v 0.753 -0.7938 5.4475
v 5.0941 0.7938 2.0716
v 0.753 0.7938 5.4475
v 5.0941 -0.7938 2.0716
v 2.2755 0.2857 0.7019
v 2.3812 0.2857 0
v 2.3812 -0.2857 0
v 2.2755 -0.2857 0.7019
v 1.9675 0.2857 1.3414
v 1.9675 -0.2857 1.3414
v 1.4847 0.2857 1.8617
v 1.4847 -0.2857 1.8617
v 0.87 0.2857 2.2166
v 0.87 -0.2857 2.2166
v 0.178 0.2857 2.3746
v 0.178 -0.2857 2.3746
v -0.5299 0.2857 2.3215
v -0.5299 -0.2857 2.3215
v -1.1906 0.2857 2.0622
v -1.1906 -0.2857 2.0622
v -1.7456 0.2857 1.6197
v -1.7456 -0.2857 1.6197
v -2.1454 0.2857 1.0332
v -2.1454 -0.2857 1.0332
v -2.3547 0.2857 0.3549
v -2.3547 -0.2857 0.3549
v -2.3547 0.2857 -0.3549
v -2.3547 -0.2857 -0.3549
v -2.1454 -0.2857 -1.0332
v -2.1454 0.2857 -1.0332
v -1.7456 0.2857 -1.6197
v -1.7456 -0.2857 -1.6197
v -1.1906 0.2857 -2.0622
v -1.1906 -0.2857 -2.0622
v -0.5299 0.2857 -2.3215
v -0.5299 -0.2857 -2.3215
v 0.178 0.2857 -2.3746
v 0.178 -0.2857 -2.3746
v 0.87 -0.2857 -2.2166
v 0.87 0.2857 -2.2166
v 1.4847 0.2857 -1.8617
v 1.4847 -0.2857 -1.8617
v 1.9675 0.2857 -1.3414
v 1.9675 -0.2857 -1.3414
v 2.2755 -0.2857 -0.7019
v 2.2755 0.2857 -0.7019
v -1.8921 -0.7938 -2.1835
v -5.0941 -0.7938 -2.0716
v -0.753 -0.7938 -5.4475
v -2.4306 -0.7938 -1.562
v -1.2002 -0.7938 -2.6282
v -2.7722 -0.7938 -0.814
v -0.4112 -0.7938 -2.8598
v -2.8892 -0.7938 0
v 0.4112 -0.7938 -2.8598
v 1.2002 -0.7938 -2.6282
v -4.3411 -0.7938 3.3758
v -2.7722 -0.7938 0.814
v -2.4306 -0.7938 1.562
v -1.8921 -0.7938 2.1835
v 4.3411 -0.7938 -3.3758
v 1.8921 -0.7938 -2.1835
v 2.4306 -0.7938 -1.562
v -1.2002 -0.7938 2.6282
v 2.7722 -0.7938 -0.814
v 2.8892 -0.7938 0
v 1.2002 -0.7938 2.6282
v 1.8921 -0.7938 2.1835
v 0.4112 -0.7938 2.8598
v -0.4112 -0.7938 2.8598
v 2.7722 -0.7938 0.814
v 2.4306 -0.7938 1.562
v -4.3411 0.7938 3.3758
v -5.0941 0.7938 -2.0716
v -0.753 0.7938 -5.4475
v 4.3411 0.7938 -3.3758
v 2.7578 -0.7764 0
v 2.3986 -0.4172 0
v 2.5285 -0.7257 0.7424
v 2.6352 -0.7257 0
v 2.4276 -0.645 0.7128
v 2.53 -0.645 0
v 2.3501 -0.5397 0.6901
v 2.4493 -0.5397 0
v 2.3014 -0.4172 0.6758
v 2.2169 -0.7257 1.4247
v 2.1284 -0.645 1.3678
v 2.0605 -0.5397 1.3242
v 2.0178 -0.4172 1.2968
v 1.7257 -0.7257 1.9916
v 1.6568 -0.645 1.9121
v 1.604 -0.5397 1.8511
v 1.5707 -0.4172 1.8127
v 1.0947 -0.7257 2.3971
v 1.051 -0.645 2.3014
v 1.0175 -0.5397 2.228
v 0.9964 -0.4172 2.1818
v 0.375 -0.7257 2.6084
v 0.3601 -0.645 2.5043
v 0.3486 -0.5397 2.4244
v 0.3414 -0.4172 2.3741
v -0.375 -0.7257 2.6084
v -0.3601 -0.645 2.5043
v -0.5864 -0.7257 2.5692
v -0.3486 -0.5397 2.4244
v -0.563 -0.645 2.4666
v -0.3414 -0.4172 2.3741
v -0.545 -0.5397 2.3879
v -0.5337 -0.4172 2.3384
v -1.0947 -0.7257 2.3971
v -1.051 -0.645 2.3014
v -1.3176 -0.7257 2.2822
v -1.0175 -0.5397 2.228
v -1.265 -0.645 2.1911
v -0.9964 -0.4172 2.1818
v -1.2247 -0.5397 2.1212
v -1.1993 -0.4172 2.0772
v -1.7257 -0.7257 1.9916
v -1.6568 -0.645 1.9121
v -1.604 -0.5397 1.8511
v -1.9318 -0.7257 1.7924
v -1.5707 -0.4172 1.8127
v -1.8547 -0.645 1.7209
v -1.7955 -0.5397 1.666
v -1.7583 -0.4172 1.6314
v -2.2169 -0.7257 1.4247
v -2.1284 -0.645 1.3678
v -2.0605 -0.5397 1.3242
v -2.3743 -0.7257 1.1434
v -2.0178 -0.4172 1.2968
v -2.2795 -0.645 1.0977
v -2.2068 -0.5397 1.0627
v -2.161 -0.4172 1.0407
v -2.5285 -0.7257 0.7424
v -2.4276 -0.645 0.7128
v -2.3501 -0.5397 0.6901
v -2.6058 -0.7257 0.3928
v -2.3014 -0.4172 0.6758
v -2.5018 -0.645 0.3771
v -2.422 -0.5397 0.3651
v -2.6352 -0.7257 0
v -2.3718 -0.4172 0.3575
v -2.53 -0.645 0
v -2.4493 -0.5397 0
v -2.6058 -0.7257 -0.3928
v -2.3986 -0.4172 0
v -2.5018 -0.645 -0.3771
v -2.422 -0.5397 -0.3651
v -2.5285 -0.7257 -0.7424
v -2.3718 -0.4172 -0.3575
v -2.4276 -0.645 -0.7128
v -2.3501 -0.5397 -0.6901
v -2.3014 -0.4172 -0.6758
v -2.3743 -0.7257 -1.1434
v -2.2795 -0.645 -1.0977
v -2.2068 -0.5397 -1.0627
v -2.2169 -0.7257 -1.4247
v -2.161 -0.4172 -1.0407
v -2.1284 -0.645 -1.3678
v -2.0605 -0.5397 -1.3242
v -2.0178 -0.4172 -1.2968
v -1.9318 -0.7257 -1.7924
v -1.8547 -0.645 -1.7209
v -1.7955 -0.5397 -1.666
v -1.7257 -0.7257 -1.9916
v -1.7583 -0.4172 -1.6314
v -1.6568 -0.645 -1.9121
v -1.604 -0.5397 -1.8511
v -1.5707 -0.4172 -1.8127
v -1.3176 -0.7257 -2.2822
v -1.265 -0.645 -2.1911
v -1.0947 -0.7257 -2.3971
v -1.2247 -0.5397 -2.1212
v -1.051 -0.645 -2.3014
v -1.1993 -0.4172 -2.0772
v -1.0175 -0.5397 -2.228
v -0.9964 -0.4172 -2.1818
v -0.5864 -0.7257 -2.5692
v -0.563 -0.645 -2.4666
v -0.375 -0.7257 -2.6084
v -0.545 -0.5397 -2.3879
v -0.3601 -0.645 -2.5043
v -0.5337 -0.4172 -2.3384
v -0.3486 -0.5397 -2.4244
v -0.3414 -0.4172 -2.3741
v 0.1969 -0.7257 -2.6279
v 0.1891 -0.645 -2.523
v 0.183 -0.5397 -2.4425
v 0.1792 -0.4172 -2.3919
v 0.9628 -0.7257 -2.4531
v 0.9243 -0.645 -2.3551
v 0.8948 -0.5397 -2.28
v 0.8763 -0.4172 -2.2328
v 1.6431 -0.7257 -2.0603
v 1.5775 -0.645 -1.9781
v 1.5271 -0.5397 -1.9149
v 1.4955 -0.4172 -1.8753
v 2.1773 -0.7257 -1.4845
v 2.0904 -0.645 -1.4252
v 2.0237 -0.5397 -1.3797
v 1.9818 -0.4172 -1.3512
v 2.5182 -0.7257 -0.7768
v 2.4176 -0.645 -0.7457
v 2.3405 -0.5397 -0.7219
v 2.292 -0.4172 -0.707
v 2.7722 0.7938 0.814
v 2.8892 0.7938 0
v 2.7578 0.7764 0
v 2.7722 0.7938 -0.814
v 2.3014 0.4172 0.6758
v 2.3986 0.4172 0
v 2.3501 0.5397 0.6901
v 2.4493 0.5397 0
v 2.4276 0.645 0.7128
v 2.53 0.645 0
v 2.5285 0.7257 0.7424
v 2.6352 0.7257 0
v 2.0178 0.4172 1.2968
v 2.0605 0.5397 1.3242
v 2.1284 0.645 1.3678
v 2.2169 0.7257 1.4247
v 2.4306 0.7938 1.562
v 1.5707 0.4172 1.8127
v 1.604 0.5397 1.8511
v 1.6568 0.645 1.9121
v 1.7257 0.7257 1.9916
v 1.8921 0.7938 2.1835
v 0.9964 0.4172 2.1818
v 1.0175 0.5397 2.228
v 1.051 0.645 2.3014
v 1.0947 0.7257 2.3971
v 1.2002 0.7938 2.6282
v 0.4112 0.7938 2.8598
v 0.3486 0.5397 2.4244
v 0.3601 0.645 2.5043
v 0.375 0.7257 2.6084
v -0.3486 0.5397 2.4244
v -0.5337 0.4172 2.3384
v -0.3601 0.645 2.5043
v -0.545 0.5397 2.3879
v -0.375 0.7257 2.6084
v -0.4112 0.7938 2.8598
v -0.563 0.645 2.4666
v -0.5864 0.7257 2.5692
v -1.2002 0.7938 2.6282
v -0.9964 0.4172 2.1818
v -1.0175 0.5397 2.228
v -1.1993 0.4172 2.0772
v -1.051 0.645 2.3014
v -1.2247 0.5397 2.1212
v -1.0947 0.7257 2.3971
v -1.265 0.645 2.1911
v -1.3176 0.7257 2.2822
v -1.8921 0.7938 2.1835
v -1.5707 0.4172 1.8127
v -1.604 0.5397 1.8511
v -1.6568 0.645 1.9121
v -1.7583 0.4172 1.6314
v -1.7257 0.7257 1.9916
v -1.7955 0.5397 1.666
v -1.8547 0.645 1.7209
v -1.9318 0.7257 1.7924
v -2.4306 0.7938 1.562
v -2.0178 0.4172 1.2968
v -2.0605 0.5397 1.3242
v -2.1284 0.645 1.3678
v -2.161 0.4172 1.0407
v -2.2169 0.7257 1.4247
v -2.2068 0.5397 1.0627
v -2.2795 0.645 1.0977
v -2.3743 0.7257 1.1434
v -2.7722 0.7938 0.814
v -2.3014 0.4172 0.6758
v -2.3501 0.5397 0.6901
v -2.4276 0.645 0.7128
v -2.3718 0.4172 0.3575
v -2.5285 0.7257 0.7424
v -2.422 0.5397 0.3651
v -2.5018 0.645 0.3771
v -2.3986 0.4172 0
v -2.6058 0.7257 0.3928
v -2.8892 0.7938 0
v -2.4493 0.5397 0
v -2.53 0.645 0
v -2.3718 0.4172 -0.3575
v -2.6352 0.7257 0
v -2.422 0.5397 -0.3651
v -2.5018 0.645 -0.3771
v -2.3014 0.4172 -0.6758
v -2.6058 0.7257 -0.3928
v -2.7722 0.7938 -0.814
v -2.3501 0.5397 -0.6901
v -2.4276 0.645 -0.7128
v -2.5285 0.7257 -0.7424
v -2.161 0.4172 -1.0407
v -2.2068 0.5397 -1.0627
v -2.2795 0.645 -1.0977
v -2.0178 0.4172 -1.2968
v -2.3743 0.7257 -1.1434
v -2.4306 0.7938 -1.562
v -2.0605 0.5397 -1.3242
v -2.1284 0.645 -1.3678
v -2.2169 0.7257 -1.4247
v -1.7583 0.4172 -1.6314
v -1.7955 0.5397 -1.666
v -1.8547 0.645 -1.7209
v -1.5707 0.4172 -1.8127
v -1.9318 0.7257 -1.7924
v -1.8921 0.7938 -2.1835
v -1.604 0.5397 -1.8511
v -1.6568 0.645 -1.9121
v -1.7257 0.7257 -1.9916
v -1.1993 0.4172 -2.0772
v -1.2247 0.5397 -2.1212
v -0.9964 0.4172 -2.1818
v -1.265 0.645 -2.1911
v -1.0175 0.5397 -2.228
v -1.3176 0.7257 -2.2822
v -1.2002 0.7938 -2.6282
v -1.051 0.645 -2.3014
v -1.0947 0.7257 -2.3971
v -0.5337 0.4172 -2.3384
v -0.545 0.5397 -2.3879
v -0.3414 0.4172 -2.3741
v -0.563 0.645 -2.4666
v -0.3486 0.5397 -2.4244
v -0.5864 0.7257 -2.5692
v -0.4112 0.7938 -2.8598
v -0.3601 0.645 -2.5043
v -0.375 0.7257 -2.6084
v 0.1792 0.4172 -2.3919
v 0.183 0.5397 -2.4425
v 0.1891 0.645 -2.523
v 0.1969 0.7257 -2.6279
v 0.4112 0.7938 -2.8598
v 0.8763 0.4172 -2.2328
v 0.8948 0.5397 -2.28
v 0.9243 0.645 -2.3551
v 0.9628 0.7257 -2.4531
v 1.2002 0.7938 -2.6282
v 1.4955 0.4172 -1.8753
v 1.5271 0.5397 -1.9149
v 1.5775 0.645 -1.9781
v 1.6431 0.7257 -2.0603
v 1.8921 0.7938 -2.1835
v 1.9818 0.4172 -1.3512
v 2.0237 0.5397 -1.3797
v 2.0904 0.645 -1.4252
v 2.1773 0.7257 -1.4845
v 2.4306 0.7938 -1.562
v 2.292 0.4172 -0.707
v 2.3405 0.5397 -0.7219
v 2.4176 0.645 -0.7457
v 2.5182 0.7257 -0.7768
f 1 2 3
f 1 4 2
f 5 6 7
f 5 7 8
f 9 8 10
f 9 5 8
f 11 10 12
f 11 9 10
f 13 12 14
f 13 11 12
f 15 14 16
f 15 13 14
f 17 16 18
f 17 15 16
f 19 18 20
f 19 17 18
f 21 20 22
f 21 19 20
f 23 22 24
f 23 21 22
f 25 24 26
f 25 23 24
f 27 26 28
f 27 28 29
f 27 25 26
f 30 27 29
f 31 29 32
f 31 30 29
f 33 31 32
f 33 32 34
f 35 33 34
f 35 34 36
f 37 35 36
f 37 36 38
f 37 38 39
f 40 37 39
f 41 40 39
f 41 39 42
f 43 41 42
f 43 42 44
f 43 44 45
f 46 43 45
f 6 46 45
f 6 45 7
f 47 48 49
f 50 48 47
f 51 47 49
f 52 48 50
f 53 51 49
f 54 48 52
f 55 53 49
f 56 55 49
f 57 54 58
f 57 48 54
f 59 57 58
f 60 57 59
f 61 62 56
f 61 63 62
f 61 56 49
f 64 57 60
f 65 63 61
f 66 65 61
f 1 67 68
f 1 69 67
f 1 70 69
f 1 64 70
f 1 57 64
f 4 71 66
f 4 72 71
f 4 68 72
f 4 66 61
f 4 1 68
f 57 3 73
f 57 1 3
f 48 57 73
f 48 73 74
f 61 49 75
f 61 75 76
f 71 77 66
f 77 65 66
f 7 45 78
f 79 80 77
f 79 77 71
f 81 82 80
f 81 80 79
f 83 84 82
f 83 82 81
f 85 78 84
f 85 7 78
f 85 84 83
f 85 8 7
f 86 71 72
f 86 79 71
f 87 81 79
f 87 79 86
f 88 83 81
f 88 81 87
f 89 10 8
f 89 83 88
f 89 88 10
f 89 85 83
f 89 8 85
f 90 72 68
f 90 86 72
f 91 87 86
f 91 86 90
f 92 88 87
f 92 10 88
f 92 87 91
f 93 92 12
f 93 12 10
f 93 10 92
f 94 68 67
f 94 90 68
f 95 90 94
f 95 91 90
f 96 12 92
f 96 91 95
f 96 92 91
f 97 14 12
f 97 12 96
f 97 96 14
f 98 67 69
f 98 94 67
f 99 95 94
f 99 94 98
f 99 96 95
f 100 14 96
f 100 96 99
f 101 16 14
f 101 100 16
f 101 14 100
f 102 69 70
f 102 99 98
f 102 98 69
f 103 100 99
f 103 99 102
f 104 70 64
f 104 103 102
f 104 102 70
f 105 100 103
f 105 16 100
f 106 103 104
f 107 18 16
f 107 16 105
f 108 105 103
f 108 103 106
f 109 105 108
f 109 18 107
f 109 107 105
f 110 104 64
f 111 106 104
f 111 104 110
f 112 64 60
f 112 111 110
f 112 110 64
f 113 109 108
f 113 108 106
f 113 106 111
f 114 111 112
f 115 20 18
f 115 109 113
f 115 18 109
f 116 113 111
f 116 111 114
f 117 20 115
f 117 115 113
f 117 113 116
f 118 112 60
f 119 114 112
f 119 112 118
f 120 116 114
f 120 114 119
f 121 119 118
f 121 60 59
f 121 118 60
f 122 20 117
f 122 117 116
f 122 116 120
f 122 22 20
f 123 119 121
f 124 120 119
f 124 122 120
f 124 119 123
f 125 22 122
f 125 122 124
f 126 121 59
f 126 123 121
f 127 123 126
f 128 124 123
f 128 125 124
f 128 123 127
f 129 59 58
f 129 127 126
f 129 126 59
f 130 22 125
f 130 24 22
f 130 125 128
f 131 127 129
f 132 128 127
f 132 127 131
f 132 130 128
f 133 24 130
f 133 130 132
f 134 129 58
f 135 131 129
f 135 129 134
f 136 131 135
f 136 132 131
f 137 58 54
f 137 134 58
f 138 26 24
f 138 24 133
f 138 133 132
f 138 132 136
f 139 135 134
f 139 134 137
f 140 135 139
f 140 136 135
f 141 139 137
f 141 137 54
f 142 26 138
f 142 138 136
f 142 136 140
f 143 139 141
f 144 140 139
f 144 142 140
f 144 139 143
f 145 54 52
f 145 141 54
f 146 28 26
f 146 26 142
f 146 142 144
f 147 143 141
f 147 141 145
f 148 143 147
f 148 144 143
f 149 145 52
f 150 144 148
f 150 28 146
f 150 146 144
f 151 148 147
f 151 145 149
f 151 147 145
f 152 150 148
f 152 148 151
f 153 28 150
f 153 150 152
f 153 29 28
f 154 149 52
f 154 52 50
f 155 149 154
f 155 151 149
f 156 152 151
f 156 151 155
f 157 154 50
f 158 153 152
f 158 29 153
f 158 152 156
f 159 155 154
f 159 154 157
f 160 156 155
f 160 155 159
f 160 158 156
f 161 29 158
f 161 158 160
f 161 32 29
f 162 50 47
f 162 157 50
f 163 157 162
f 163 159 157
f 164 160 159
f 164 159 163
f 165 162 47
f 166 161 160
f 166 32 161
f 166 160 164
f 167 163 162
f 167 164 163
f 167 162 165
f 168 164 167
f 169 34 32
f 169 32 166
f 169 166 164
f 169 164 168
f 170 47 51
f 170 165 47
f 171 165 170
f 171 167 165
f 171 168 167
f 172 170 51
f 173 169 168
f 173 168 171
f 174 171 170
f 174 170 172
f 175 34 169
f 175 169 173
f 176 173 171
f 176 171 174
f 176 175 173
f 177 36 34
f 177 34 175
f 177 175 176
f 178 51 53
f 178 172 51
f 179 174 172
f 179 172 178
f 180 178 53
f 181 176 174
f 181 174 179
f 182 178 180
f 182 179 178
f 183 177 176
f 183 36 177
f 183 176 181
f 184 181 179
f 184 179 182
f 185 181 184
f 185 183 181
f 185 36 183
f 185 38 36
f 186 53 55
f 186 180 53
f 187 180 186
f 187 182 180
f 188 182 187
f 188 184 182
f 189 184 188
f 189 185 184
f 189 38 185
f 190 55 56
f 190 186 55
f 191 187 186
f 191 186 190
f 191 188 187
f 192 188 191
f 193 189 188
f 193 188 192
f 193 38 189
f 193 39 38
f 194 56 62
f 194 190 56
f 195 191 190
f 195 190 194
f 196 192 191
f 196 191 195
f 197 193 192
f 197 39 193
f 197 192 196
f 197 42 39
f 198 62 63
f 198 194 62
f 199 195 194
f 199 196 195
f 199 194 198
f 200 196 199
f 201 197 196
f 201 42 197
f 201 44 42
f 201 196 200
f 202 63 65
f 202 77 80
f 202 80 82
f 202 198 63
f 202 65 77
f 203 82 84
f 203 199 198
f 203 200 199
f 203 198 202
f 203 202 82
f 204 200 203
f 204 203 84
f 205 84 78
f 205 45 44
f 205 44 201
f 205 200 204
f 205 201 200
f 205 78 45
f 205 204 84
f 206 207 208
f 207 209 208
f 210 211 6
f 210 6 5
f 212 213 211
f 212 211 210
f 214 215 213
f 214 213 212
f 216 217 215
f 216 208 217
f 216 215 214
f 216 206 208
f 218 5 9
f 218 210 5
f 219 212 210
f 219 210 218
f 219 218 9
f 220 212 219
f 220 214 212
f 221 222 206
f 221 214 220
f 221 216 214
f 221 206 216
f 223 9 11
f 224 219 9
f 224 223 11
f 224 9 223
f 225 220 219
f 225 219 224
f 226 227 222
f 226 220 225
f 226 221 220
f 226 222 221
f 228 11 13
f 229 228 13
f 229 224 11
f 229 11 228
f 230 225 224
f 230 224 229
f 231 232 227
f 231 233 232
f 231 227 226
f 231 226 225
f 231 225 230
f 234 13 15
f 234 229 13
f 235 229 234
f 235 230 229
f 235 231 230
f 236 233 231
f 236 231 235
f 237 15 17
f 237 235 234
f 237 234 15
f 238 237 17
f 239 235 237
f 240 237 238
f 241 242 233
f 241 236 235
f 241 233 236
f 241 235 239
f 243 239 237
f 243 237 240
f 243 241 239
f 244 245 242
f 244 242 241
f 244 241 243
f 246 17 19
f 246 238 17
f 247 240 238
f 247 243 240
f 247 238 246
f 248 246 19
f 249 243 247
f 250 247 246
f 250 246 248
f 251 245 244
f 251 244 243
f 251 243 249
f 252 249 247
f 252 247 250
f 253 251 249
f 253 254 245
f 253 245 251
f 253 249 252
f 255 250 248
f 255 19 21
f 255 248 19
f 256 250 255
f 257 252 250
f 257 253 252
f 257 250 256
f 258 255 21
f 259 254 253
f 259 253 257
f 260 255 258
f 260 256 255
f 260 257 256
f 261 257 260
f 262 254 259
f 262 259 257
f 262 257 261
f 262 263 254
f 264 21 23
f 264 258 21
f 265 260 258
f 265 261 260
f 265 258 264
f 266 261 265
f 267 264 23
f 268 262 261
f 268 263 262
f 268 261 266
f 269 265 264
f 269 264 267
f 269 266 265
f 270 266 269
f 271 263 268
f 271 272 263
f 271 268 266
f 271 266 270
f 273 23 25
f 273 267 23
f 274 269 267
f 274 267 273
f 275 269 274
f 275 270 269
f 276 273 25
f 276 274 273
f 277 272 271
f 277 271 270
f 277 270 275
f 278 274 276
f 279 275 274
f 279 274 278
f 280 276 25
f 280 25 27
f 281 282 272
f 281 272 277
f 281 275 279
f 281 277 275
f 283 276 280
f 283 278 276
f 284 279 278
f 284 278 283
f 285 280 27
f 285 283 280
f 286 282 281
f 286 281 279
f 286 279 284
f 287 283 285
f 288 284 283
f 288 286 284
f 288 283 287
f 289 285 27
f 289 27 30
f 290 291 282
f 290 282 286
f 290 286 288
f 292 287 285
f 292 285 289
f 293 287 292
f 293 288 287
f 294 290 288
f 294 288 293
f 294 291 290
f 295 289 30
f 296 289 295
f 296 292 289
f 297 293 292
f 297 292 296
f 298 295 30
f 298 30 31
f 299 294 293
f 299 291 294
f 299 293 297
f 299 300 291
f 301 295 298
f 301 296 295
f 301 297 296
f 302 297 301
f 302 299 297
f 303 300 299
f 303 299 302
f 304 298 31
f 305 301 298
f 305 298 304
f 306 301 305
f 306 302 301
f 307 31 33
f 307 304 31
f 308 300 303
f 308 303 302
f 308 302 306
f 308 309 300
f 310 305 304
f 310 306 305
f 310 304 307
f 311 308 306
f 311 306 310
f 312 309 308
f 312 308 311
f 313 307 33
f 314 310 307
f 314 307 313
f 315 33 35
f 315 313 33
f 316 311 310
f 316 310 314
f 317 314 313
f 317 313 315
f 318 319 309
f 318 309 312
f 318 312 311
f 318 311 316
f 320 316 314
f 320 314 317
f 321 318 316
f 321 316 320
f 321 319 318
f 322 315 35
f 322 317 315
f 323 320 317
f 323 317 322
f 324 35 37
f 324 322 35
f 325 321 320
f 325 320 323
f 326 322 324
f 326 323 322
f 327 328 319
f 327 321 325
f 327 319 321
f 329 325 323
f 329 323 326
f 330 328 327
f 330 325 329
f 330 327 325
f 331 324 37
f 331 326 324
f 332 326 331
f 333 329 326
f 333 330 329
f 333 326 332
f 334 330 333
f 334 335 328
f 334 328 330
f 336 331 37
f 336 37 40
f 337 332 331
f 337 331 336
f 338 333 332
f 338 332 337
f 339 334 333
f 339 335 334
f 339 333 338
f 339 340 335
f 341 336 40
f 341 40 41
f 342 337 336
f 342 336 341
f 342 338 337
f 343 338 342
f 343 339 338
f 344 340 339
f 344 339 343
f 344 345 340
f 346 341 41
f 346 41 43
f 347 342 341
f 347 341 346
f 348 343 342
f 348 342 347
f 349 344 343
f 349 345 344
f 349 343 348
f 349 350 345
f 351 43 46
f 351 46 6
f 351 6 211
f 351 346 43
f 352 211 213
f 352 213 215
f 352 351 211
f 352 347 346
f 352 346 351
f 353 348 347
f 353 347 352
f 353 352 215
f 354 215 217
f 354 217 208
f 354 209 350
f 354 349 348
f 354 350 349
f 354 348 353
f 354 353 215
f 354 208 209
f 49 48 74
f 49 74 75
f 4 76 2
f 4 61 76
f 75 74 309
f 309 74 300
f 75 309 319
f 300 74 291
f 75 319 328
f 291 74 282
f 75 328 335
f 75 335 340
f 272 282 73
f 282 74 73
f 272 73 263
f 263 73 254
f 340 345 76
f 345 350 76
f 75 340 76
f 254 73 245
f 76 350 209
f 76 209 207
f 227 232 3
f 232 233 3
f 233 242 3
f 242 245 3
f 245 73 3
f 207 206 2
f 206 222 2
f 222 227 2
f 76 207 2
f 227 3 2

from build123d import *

# Parameters (mm, degrees)
F0_R     = 2.38125
F1_DEPTH = 0.79375
F2_R     = 0.508
F3_R     = 0.508


with BuildPart() as f1:
    # F0 (on Front) → F1 (new body, symmetric)
    with BuildSketch(Plane.XZ):
        Polygon((0.7529974873, 5.447464528), (-4.3411439238, 3.375847217), (-5.0941414111, -2.071617311), (-0.7529974873, -5.447464528), (4.3411439238, -3.375847217), (5.0941414111, 2.071617311), align=None)
        Circle(F0_R, mode=Mode.SUBTRACT)
    extrude(amount=F1_DEPTH, both=True)

    # F2
    f2_edges = [f1.edges().sort_by_distance(p)[0] for p in [
        (-2.38125, -0.79375, 0),
    ]]
    fillet(f2_edges, radius=F2_R)

    # F3
    f3_edges = [f1.edges().sort_by_distance(p)[0] for p in [
        (-2.38125, 0.79375, 0),
    ]]
    fillet(f3_edges, radius=F3_R)


solid = f1.part
